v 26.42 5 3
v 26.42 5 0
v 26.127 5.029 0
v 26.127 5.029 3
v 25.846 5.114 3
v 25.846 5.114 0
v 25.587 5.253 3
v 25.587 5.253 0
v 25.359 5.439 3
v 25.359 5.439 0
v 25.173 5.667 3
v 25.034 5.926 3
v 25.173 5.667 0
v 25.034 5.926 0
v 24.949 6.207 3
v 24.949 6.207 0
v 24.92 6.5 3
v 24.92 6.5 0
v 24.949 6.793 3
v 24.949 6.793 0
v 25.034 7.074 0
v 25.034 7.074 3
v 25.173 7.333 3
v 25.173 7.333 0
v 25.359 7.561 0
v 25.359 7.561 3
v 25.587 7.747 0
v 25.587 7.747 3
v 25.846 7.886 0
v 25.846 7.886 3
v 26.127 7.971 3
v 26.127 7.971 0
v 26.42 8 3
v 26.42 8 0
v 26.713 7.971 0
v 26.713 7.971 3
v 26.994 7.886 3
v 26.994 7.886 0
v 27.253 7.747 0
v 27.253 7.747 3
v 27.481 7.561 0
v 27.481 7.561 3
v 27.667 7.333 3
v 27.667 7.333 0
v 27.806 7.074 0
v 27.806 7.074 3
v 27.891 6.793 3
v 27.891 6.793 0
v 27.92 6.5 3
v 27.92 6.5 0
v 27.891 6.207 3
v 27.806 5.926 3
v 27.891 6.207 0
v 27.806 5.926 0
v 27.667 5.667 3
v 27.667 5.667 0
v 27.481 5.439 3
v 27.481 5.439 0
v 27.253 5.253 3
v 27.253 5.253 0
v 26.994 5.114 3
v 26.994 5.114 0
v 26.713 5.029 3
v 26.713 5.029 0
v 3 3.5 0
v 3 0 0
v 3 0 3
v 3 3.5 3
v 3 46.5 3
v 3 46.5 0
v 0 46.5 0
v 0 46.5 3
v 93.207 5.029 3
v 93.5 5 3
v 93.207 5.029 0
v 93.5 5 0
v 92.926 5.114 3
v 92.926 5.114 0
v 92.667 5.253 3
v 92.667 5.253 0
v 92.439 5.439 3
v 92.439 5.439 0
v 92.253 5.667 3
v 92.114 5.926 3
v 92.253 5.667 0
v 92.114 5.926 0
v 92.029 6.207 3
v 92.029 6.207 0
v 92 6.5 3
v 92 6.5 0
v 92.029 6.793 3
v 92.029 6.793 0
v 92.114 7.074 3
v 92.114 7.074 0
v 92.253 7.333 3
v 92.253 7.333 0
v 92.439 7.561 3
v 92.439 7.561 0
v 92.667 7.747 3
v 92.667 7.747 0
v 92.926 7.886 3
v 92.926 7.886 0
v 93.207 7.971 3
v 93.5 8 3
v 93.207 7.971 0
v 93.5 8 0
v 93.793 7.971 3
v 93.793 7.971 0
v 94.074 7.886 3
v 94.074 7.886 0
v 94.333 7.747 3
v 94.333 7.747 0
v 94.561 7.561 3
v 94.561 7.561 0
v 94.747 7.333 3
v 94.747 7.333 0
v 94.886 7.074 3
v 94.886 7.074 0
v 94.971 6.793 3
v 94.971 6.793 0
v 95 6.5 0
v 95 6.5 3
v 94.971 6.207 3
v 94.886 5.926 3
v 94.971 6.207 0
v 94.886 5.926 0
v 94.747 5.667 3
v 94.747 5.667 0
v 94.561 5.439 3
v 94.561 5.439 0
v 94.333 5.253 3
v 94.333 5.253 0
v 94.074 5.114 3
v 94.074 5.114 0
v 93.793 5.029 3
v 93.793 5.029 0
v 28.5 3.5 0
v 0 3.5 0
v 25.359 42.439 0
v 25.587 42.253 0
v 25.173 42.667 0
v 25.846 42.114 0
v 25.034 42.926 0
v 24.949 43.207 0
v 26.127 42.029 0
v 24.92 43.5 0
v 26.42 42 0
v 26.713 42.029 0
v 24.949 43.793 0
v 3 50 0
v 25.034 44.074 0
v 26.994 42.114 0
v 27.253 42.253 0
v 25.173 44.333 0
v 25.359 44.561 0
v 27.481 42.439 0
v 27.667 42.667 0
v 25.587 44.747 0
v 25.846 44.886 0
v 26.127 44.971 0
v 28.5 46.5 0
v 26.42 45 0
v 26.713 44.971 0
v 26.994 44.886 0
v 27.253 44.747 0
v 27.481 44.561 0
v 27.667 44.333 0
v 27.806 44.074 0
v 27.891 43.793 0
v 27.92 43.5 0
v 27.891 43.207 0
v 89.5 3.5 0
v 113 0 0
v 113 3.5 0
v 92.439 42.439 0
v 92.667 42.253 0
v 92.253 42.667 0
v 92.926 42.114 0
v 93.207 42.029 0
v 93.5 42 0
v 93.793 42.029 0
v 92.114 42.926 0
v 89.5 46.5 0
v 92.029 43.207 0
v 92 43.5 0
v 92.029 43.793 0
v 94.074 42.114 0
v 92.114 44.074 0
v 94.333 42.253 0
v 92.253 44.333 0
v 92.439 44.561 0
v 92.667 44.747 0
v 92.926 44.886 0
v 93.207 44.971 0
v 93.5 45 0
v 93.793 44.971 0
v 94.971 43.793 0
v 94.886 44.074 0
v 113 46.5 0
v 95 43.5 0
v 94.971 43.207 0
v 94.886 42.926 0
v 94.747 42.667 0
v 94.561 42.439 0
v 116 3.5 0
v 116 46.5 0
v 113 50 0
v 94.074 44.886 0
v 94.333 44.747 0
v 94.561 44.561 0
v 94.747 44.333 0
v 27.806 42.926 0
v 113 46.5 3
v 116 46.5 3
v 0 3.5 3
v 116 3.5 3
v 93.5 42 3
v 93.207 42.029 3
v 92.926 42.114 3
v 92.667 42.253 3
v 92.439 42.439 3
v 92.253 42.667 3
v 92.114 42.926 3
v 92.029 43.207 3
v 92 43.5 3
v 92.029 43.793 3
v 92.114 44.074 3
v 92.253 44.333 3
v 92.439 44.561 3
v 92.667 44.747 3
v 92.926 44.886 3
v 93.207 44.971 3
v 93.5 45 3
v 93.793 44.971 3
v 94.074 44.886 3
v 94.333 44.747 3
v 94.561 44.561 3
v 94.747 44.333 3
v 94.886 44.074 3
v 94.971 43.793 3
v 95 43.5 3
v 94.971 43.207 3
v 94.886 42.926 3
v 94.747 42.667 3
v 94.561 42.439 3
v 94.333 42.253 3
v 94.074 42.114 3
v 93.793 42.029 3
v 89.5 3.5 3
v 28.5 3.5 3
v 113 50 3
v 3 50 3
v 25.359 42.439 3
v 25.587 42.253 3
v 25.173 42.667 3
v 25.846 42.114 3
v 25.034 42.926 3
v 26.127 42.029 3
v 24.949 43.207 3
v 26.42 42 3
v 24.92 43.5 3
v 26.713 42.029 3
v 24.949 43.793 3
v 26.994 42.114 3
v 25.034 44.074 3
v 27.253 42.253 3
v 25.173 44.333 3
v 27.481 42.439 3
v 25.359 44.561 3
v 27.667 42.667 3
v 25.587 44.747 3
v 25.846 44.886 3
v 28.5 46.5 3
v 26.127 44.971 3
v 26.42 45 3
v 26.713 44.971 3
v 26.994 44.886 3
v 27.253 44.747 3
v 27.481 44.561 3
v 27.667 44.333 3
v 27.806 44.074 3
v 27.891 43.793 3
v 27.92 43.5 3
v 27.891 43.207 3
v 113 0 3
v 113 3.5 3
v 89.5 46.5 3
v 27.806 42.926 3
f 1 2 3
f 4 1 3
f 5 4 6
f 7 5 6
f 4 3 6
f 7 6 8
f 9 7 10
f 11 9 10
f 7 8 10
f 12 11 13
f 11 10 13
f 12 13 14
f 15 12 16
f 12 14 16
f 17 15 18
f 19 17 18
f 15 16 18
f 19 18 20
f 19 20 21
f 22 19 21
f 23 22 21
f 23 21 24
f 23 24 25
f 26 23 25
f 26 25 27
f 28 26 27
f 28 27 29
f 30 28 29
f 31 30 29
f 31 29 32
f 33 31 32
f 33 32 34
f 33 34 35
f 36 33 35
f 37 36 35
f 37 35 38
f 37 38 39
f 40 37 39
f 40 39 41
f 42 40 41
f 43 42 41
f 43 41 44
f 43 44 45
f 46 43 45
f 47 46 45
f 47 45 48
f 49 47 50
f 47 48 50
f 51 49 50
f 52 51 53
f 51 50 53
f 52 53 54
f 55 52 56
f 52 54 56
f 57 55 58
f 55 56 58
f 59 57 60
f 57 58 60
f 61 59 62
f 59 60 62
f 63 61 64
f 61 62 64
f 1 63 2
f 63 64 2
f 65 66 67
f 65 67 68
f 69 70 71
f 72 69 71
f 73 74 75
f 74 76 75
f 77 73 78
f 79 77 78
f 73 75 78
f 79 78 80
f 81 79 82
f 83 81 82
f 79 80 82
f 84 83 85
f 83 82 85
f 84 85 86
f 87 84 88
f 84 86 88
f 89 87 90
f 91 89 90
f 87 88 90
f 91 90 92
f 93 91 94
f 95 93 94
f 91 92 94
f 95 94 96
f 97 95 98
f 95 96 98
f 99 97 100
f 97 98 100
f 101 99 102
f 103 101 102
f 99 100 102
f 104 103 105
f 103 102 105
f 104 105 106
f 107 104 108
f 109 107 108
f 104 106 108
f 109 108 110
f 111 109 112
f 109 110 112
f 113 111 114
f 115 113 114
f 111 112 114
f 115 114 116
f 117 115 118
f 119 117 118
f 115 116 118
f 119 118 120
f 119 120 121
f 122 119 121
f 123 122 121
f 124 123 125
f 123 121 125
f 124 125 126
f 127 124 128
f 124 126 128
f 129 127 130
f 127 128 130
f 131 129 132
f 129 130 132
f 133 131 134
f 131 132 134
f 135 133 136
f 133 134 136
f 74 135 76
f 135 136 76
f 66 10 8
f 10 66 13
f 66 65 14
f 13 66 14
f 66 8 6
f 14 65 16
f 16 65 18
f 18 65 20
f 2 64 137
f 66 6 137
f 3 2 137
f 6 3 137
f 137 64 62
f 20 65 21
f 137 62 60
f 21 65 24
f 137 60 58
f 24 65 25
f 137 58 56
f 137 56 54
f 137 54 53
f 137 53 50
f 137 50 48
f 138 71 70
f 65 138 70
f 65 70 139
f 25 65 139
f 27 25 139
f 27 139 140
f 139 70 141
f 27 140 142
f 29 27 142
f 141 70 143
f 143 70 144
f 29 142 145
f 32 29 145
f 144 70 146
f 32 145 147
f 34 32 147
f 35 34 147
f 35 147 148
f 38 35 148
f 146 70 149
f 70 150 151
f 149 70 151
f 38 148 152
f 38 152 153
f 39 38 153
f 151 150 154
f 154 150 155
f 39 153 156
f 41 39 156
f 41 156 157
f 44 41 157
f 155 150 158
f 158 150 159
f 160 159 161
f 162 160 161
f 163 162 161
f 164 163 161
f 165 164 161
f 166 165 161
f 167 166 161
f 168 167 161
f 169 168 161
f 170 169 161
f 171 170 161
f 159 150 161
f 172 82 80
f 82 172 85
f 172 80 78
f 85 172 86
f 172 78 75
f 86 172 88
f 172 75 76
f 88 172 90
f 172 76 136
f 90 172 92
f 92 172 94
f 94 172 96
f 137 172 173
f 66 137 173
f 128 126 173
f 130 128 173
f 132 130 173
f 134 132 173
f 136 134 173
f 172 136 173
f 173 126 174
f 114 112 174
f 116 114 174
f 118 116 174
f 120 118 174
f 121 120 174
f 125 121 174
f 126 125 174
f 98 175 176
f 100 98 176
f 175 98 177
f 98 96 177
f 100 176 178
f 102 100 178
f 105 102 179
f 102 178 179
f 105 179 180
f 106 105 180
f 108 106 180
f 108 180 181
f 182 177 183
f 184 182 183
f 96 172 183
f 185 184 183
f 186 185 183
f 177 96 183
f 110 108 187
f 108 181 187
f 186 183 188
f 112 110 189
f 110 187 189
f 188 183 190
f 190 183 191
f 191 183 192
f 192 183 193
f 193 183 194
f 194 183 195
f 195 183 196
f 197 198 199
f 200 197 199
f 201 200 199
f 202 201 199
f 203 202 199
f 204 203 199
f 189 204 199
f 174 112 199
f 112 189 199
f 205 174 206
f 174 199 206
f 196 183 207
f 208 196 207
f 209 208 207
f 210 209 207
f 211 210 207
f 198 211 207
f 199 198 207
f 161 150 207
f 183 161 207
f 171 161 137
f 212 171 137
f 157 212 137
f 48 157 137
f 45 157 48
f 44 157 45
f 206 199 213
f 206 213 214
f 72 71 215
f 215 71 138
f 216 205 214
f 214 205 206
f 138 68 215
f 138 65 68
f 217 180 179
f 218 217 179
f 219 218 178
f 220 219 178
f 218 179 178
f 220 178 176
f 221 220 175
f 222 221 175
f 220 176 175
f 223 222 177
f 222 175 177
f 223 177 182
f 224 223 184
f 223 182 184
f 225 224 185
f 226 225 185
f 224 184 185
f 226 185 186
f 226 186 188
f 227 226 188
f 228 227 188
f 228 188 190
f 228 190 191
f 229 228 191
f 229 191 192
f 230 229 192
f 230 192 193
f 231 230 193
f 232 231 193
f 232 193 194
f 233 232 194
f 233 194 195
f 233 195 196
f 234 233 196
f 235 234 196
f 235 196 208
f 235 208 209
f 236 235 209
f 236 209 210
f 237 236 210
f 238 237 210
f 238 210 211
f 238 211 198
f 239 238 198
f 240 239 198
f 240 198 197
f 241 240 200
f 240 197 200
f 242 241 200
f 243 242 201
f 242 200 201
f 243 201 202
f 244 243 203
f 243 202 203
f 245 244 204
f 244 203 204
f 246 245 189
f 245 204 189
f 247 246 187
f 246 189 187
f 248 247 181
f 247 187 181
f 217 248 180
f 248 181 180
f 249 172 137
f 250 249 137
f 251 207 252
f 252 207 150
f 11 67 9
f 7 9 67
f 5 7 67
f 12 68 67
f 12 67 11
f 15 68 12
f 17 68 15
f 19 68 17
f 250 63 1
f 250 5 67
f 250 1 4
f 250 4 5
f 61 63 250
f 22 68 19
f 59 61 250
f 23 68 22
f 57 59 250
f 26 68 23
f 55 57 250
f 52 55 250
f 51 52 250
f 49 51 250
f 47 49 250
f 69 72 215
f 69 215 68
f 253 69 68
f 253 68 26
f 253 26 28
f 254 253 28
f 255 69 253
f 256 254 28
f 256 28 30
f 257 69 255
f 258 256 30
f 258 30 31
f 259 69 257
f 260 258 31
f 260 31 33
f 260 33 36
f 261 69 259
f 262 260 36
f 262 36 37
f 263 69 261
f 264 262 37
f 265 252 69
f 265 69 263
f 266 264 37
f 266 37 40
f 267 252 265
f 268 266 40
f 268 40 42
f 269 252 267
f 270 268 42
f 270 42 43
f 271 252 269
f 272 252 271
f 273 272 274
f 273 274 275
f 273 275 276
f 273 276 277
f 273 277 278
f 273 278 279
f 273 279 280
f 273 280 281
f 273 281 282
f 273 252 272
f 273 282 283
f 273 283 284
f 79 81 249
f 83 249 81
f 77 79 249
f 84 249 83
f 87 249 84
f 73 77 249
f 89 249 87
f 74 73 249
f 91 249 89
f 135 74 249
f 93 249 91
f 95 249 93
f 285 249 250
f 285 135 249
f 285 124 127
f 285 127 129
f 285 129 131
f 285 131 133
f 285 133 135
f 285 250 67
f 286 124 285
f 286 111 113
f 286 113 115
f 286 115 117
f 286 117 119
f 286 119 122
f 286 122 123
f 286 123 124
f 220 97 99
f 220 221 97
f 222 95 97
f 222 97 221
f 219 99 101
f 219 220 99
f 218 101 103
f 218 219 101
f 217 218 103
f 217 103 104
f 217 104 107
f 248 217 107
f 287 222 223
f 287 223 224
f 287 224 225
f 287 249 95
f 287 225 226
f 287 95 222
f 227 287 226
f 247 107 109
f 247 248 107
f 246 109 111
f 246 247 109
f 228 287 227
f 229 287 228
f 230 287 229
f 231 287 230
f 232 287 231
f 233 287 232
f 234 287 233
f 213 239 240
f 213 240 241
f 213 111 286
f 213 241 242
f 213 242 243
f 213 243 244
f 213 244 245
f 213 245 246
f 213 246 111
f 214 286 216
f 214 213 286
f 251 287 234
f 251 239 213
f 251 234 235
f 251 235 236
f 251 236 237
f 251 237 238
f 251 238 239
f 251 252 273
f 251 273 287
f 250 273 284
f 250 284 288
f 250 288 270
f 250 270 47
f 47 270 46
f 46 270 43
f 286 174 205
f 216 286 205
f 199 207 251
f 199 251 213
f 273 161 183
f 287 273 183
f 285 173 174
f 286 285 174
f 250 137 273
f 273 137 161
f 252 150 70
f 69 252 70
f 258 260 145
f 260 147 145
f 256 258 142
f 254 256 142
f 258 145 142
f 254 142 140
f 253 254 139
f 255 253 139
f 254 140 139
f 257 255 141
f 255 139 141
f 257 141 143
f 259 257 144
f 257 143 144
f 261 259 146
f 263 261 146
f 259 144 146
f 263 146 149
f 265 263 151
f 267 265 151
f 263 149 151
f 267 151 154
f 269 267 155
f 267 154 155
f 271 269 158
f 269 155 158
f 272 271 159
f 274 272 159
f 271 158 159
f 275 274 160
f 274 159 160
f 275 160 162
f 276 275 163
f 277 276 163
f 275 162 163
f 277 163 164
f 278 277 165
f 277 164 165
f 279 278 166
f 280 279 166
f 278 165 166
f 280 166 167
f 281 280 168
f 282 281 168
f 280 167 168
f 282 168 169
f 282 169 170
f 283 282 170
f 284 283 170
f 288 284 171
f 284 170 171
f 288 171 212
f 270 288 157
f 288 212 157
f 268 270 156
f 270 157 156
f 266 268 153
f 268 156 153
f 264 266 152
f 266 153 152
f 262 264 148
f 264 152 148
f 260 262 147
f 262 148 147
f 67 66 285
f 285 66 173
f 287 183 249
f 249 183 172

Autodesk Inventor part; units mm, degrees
ref_plane "YZ Plane" through (0, 0, 0) normal (1, 0, 0) x (0, 1, 0)
ref_plane "XZ Plane" through (0, 0, 0) normal (0, 1, 0) x (-1, 0, 0)
ref_plane "XY Plane" through (0, 0, 0) normal (0, 0, 1) x (1, 0, 0)
sketch "Sketch1" plane through (0, 0, 0) normal (0, 0, 1) x (1, 0, 0)
  line L0 (0, 0) -> (116, 0)
  line L1 (116, 0) -> (116, 50)
  line L2 (116, 50) -> (0, 50)
  line L3 (0, 50) -> (0, 0)
  line L4 (0, 50) -> (3, 50)
  line L5 (3, 50) -> (3, 46.5)
  line L6 (3, 46.5) -> (0, 46.5)
  line L7 (0, 46.5) -> (0, 50)
  line L8 (0, 0) -> (3, 0)
  line L9 (3, 0) -> (3, 3.5)
  line L10 (3, 3.5) -> (0, 3.5)
  line L11 (0, 3.5) -> (0, 0)
  line L12 (58, 0) -> (58, 50) construction
  line L13 (113, 50) -> (113, 46.5)
  line L14 (113, 46.5) -> (116, 46.5)
  line L15 (113, 0) -> (113, 3.5)
  line L16 (113, 3.5) -> (116, 3.5)
  line L17 (19.5, 46.5) -> (96.5, 46.5) construction
  line L18 (96.5, 46.5) -> (96.5, 3.5) construction
  line L19 (96.5, 3.5) -> (19.5, 3.5) construction
  line L20 (19.5, 3.5) -> (19.5, 46.5) construction
  line L21 (28.5, 46.5) -> (89.5, 46.5)
  line L22 (89.5, 46.5) -> (89.5, 3.5)
  line L23 (89.5, 3.5) -> (28.5, 3.5)
  line L24 (28.5, 3.5) -> (28.5, 46.5)
  point P0 (1.5, 25)
  point P1 (0, 25)
  point P2 (1.5, 3.5)
  point P3 (19.5, 25)
  point P4 (58, 46.5)
  point P5 (1.5, 46.5)
  point P6 (94.5, 5.5)
  point P7 (94.5, 44.5)
  point P8 (26, 44.5)
  point P9 (26, 5.5)
  point P10 (0, 46.5)
  point P11 (0, 3.5)
  dimension "d0" = 116
  dimension "d1" = 50
  dimension "d2" = 3
  dimension "d4" = 21.5
  dimension "d5" = 21.5
  dimension "d6" = 77
  dimension "d7" = 61
  dimension "d8" = 9
  dimension "d9" = 2
  dimension "d10" = 2
  dimension "d11" = 2
  dimension "d12" = 6.5
  dimension "d13" = 2
extrude "Extrusion1" add sketch "Sketch1" along normal blind 3 contours L9 L10 L3 L6 L5 L2 L13 L14 L1 L16 L15 L0
sketch "Sketch2" plane through (0, 0, 3) normal (0, 0, 1) x (1, 0, 0)
  line L0 (28.5, 46.5) -> (89.5, 46.5) projected
  line L1 (19.5, 46.5) -> (96.5, 46.5)
  line L2 (96.5, 46.5) -> (96.5, 3.5)
  line L3 (96.5, 3.5) -> (19.5, 3.5)
  line L4 (19.5, 3.5) -> (19.5, 46.5)
  line L5 (113, 50) -> (3, 50) projected
  line L6 (0, 46.5) -> (0, 3.5) projected
  point P0 (0, 0)
  point P1 (26.42, 43.5)
  point P2 (26.42, 6.5)
  point P3 (58, 46.5)
  point P4 (58, 50)
  point P5 (19.5, 25)
  point P6 (0, 25)
  point P7 (93.5, 43.5)
  point P8 (93.5, 6.5)
  dimension "d17" = 77
  dimension "d18" = 3
  dimension "d19" = 3
  dimension "d20" = 3
  dimension "d28" = 6.92
hole "Hole1" at (26.42, 43.5, 3) at (26.42, 6.5, 3) at (93.5, 6.5, 3) at (93.5, 43.5, 3) direction (0, 0, -1) diameter 3 end through all
properties part number "pantallaSoport"
